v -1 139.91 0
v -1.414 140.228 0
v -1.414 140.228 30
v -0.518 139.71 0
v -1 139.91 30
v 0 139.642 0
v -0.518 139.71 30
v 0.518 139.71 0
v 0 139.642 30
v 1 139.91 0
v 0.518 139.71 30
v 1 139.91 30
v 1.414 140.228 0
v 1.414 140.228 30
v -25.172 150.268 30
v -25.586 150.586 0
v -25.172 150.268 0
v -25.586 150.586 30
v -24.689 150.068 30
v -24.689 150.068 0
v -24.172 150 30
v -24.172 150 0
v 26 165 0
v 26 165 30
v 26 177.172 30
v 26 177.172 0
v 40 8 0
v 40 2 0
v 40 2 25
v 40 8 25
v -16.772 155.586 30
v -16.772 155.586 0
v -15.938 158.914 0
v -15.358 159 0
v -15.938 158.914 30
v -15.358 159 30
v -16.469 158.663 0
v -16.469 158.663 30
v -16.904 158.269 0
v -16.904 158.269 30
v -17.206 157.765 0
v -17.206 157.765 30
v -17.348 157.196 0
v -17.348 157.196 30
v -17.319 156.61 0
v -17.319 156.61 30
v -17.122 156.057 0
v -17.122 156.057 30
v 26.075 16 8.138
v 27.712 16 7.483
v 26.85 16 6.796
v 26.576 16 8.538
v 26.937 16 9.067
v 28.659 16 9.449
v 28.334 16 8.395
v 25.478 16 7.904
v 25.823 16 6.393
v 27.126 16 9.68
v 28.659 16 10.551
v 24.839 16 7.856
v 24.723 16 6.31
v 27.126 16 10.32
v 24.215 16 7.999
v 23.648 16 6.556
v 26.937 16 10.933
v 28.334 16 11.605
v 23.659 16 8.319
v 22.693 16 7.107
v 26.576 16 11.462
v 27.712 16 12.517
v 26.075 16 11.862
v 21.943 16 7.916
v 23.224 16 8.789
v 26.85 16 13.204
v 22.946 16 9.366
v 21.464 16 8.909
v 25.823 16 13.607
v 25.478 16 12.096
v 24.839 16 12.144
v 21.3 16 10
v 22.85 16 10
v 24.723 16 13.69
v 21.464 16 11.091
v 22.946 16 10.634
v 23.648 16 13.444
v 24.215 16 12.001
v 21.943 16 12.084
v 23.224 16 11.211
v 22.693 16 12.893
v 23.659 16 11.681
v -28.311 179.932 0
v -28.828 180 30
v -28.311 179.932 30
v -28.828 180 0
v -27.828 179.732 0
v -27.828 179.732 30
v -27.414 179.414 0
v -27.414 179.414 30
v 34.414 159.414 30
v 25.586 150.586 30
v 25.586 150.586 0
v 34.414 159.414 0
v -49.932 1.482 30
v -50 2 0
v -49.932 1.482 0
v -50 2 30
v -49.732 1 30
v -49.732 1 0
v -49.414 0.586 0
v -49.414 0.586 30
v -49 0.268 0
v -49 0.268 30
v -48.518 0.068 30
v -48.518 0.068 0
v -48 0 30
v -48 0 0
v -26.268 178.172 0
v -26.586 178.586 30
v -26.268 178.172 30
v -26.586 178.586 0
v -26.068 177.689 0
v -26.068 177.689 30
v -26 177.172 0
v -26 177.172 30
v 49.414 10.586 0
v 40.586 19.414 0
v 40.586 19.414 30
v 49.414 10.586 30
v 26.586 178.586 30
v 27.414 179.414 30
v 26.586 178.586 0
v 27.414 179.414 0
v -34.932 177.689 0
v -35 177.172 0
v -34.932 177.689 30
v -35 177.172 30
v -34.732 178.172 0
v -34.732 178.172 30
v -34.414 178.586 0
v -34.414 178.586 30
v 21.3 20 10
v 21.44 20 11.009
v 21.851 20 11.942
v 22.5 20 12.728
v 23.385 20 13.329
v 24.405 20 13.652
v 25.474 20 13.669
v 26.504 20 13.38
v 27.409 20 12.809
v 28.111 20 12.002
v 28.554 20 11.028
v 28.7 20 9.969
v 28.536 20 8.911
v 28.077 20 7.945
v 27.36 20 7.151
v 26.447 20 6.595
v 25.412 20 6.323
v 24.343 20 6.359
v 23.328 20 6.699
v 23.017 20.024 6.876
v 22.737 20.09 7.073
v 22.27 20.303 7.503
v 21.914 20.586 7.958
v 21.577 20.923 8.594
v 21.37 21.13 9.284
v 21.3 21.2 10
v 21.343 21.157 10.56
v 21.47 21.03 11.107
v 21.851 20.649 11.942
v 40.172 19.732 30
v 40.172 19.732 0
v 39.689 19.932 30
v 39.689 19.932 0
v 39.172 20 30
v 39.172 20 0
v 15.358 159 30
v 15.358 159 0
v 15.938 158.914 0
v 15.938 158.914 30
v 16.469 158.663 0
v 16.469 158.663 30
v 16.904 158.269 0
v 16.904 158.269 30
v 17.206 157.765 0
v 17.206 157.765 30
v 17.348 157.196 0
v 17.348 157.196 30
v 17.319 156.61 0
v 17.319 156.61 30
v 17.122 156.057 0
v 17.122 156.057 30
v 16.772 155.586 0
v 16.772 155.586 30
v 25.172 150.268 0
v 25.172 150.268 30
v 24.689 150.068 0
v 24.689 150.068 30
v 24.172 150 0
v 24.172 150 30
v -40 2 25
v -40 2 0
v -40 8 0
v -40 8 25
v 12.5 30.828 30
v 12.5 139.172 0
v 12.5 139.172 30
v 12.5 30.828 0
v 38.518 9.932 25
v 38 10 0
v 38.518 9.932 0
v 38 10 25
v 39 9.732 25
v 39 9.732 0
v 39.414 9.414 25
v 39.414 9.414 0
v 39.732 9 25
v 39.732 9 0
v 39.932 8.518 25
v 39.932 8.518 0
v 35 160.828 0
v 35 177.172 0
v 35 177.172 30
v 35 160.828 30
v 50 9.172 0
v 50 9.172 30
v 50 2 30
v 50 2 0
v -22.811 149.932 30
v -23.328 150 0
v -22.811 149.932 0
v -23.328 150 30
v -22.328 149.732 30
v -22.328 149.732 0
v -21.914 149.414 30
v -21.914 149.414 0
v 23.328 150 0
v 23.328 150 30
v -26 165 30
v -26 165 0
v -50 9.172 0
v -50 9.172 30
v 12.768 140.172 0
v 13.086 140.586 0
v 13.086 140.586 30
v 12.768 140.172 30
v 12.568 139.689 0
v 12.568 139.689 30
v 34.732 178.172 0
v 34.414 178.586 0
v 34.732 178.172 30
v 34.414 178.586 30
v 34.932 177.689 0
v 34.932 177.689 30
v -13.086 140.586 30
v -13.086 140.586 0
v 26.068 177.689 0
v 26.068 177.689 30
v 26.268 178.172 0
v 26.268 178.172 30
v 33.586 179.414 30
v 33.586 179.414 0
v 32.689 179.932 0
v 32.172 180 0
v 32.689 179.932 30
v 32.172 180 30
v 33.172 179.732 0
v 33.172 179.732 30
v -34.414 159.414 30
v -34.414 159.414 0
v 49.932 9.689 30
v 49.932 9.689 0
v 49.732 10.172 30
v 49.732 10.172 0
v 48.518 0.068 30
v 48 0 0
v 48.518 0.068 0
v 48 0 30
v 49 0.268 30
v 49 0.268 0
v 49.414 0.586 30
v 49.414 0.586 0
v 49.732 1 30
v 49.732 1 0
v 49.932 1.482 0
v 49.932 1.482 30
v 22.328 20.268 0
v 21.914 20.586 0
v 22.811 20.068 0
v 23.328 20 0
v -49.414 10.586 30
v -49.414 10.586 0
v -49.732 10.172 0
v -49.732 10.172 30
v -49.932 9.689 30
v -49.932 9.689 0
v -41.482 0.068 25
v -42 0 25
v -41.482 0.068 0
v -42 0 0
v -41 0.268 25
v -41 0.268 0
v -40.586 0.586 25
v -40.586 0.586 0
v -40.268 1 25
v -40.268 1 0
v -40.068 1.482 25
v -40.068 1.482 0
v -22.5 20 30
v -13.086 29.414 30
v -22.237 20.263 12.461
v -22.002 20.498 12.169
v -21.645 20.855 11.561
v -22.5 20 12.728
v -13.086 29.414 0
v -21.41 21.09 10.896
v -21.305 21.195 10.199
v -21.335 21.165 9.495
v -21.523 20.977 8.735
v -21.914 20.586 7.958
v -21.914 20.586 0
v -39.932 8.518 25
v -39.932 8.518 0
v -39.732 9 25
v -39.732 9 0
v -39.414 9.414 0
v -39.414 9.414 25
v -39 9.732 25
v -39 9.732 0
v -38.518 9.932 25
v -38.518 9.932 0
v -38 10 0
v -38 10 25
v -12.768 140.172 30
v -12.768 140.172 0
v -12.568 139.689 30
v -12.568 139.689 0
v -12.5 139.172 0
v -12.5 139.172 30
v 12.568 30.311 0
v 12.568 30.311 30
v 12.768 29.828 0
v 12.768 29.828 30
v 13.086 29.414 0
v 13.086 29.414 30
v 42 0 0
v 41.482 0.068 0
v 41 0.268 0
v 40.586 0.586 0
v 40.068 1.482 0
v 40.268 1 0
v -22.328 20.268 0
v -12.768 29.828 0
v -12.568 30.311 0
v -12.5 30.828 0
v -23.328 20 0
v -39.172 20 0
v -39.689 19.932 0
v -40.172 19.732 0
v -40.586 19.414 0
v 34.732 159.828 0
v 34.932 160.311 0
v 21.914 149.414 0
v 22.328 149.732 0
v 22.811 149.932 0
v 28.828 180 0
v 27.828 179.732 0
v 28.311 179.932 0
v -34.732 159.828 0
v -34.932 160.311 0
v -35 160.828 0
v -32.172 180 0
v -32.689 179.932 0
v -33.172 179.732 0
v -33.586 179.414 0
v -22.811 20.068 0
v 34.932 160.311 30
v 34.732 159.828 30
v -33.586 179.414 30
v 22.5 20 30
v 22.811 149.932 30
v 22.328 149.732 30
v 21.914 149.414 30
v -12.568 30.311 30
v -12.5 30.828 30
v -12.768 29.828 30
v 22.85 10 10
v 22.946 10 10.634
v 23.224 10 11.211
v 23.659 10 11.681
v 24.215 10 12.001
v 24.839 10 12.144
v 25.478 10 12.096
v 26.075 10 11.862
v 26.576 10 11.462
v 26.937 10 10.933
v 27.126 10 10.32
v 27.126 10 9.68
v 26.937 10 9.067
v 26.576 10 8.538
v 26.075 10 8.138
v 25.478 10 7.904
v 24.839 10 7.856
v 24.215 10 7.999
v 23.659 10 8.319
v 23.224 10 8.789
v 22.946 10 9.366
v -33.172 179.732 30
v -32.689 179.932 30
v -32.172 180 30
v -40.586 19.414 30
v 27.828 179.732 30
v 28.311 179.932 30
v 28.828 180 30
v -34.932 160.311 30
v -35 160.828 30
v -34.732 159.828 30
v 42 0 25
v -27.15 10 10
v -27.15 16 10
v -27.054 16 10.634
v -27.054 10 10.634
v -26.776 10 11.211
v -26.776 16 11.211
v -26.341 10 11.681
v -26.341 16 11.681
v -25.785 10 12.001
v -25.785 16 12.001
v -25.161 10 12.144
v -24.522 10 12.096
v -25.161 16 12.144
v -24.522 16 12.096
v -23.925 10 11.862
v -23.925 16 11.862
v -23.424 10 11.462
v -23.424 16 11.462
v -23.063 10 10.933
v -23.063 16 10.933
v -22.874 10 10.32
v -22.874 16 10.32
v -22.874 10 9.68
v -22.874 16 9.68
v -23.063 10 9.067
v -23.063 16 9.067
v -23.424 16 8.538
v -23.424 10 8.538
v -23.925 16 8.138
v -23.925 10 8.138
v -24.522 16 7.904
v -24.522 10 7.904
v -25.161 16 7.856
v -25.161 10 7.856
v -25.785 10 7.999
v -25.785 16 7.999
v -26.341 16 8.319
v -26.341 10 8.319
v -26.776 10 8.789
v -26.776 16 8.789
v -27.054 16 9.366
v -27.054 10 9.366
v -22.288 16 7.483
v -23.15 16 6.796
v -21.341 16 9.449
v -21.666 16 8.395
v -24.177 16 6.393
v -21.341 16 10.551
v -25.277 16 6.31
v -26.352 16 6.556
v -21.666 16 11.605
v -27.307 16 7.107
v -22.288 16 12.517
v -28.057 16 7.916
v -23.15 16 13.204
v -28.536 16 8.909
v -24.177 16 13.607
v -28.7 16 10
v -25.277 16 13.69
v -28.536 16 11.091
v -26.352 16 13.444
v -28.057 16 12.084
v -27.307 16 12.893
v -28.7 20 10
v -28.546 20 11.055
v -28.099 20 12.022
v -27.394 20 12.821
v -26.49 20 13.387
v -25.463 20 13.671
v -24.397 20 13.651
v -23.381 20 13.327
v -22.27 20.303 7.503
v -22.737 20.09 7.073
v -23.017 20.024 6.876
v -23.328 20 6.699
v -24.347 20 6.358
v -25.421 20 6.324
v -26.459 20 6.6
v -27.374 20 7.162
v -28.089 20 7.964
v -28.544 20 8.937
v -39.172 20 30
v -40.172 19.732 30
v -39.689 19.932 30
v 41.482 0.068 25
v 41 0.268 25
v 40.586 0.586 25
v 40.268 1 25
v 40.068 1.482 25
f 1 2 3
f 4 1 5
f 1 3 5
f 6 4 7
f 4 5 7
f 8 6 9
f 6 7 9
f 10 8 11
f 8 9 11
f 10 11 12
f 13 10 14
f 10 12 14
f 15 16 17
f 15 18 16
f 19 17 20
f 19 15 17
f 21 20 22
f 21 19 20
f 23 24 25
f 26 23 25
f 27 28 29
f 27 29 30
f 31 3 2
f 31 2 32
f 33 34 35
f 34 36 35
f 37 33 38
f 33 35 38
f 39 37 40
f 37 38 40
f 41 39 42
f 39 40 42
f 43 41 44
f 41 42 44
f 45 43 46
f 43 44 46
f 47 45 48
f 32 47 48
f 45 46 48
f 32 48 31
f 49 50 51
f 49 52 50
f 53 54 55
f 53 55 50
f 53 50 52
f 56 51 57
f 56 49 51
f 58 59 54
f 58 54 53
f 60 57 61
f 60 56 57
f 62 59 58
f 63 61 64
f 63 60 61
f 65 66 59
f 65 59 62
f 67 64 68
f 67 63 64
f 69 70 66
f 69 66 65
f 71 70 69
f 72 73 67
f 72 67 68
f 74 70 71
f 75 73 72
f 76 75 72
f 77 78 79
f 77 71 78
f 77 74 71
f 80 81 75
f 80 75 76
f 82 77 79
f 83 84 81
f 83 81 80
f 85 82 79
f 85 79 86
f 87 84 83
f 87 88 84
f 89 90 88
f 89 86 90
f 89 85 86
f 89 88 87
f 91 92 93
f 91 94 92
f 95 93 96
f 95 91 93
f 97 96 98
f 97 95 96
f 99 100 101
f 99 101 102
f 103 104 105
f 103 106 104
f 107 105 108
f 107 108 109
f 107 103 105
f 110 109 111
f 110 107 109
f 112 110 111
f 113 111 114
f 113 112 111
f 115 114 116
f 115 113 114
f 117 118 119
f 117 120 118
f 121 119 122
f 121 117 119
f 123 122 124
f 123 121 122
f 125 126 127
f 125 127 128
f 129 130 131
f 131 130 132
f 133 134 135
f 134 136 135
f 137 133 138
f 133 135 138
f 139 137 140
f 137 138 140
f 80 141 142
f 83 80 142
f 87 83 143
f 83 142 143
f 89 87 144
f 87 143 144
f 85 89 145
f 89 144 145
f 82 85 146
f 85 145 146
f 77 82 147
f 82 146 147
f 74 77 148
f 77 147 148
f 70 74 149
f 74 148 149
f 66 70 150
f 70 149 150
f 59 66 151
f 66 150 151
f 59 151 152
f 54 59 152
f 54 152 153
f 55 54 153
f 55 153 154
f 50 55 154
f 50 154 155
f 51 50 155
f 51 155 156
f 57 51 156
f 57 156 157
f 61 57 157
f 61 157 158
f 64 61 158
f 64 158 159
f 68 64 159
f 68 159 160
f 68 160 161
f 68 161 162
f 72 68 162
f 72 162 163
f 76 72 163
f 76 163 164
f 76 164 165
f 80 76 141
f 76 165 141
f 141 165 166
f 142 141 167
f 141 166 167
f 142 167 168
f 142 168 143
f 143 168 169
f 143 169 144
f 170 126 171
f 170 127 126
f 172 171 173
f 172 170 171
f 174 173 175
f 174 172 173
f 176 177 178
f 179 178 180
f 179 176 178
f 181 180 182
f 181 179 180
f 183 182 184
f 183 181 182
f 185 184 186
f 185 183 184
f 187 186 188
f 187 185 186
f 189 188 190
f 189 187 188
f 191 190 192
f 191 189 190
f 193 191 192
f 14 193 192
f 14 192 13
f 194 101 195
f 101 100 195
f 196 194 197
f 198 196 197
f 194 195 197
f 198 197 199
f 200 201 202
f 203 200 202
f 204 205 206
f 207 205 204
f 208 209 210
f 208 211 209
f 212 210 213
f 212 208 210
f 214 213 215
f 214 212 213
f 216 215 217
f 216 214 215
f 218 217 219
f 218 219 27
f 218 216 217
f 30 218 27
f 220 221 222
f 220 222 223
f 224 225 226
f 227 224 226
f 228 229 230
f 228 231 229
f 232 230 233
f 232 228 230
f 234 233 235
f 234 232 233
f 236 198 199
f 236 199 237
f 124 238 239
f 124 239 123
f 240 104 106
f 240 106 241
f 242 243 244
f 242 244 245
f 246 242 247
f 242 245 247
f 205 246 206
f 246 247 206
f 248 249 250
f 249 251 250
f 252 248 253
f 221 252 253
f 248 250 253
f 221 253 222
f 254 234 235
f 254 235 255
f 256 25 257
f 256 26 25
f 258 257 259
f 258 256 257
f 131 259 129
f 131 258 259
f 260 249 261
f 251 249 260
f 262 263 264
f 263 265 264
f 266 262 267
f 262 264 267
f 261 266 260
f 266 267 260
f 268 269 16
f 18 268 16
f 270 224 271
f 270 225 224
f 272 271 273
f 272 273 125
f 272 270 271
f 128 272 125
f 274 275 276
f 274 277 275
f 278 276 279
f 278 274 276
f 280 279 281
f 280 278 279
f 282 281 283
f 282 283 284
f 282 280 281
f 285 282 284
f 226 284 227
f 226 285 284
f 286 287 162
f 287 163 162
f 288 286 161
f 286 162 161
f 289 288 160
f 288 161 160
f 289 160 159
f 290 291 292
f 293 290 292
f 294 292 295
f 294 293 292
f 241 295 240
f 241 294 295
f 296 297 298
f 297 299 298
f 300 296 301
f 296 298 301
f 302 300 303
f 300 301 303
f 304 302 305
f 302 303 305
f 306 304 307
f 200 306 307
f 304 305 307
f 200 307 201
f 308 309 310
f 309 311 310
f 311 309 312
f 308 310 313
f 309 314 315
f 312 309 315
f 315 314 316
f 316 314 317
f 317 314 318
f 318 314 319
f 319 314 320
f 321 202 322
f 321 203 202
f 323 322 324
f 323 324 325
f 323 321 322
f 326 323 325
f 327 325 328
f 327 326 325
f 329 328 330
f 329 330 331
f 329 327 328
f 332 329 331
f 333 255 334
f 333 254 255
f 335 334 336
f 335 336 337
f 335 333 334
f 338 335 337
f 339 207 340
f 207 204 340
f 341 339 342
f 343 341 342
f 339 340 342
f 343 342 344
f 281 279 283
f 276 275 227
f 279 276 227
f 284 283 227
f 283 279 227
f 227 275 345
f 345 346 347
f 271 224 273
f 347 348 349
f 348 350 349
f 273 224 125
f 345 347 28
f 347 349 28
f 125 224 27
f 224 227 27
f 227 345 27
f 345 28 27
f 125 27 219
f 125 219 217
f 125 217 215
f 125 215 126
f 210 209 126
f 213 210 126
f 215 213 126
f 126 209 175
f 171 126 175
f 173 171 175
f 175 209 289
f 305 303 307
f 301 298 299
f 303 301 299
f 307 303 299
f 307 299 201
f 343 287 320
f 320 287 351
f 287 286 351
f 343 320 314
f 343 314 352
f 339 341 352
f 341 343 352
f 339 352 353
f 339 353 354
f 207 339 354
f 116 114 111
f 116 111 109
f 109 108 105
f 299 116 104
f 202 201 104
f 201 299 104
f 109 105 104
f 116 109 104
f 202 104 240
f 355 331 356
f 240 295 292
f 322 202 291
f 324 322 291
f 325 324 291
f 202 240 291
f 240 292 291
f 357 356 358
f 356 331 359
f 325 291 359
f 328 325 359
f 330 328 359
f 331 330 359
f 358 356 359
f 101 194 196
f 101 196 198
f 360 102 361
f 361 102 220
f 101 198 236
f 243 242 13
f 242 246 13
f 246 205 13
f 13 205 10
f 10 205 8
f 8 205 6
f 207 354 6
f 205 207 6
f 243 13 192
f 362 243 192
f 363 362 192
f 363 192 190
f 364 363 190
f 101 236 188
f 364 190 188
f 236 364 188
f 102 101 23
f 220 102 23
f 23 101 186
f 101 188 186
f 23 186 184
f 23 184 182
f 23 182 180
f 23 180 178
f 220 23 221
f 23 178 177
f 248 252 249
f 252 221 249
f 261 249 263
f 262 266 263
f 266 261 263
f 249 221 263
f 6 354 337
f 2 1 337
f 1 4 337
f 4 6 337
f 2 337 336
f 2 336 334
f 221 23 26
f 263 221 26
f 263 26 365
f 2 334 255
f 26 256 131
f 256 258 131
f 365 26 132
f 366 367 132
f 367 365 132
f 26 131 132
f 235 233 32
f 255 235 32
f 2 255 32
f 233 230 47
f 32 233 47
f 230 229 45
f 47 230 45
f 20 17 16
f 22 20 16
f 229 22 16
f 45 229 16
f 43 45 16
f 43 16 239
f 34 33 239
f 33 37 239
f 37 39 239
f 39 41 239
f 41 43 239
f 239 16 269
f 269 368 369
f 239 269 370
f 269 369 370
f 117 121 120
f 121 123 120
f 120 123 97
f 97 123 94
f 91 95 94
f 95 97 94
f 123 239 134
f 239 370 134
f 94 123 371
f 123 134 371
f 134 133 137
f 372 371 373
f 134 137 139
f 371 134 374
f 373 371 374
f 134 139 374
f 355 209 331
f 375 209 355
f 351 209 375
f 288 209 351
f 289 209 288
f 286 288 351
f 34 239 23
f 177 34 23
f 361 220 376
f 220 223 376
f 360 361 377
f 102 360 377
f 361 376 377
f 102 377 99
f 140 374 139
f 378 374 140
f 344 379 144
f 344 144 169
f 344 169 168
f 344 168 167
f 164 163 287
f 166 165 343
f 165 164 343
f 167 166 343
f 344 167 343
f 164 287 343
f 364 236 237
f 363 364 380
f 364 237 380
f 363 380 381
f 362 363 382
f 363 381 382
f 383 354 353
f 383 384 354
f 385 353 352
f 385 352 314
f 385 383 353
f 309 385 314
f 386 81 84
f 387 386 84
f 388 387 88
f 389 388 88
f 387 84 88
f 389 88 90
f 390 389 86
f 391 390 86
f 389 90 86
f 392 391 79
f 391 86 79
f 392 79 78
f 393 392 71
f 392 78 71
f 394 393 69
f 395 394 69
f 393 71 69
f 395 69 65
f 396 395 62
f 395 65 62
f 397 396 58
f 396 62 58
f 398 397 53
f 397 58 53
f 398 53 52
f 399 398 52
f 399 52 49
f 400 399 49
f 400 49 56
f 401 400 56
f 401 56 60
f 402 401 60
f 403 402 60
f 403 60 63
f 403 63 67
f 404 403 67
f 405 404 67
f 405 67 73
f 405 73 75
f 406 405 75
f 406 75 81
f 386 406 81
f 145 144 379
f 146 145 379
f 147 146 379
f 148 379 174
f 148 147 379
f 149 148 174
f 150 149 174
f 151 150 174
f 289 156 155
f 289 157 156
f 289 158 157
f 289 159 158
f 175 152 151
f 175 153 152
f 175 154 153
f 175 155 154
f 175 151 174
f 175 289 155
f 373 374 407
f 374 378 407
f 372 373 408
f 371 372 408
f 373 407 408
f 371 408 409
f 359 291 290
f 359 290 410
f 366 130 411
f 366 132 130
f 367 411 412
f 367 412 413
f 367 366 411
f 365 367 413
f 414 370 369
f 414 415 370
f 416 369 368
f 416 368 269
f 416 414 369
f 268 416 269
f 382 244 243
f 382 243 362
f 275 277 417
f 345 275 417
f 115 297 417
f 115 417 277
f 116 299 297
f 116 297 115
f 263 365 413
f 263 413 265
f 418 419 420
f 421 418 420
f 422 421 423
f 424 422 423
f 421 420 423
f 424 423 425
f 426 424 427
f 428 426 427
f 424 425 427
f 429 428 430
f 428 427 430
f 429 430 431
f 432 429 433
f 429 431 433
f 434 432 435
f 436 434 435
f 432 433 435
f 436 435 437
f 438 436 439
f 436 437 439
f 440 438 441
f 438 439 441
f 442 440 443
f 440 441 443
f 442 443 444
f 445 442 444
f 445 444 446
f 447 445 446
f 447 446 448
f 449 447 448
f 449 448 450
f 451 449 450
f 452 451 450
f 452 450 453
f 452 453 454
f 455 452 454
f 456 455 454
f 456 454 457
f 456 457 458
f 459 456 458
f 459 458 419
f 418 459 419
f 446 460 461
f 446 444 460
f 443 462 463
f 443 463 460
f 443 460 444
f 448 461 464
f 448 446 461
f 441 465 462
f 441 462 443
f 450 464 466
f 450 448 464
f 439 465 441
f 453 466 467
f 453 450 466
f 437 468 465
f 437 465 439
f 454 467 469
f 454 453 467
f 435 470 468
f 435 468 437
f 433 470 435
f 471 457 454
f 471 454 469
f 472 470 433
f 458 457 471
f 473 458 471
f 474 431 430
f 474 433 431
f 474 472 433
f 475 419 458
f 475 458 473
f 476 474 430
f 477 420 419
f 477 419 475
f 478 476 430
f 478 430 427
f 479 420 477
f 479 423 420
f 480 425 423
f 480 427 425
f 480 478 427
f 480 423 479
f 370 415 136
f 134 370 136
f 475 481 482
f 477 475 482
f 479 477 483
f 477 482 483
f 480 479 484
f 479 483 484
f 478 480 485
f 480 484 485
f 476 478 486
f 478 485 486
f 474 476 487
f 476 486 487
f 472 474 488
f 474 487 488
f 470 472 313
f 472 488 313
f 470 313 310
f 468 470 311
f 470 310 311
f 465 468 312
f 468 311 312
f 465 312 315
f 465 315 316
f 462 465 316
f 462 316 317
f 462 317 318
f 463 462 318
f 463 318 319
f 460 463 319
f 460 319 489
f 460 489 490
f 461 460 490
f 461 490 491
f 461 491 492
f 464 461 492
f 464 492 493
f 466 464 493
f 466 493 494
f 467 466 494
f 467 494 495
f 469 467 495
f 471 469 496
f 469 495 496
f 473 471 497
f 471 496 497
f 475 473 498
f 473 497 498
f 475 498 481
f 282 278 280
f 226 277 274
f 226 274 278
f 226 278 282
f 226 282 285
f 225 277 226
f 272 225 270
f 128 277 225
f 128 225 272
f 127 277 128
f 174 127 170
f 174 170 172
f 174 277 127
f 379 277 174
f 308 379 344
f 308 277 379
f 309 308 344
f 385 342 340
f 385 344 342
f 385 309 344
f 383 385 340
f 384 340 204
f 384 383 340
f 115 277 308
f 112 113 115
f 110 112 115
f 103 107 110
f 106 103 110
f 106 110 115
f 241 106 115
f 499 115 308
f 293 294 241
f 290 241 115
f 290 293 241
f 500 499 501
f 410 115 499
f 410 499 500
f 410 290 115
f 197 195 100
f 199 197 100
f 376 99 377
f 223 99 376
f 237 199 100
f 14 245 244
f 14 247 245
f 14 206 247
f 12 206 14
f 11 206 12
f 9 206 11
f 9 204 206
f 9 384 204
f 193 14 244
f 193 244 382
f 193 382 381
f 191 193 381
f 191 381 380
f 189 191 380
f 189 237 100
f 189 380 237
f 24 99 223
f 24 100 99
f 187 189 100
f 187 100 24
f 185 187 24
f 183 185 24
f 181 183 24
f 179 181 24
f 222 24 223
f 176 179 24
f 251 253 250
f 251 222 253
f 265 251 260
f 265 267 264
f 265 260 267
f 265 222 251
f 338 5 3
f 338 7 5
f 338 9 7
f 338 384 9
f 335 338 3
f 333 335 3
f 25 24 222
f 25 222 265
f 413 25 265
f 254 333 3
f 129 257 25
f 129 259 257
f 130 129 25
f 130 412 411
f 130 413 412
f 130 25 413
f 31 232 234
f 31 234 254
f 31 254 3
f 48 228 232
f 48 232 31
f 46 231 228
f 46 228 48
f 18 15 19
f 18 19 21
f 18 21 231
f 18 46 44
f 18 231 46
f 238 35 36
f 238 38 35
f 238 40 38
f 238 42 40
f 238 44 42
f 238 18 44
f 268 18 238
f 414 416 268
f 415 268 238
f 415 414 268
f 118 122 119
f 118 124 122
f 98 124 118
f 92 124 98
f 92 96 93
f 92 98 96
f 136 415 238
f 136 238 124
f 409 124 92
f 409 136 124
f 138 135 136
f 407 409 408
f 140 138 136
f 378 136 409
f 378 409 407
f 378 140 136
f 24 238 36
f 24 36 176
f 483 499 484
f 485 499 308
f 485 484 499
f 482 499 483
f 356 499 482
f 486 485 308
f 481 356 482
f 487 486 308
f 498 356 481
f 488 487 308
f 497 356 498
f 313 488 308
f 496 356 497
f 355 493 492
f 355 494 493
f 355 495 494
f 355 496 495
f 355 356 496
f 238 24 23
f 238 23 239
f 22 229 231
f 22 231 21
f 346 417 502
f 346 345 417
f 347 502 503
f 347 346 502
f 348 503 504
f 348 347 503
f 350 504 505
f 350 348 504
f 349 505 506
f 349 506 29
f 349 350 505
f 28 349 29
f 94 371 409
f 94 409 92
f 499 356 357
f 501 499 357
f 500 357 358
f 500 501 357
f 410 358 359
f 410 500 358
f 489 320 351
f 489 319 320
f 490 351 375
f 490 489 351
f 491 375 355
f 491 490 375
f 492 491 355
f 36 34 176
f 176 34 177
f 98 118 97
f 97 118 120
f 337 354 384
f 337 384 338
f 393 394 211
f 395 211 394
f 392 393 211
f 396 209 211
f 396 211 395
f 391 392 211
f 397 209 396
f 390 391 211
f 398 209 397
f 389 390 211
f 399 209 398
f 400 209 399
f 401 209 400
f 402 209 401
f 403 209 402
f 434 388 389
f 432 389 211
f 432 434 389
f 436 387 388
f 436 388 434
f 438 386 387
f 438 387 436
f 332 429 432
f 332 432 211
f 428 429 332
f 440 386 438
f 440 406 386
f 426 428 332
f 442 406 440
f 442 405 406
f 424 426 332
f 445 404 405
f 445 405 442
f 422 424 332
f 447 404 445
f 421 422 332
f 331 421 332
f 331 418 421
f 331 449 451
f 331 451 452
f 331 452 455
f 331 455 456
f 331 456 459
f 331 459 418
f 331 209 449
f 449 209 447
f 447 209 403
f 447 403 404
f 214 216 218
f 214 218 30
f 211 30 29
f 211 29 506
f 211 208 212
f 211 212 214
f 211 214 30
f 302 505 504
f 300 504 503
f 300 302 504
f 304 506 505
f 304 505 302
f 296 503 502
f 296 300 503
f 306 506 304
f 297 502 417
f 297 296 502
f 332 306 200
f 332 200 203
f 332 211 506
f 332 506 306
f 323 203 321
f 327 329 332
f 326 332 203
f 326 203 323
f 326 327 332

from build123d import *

# Parameters (mm, degrees)
EXTRUDE_1_DEPTH     = 30
SKETCH_3_W          = 52
SKETCH_3_H          = 30
CUT_EXTRUDE_1_DEPTH = 190.208879284
SKETCH_4_W          = 80
SKETCH_4_H          = 20
CUT_EXTRUDE_2_DEPTH = 25
SKETCH_5_R          = 2.15
CUT_EXTRUDE_3_DEPTH = 171.293863659
SKETCH_6_R          = 3.7
CUT_EXTRUDE_4_DEPTH = 4
CHAMFER_1_SIZE      = 10
CHAMFER_2_SIZE      = 2
FILLET_1_R          = 2
CUT_EXTRUDE_5_DEPTH = 190.208879284
FILLET_2_R          = 2


with BuildPart() as part:
    # 草图2 → 凸台-拉伸1 (new body)
    with BuildSketch(Plane.XY):
        Polygon((-35, 180), (35, 180), (35, 150), (12.5, 150), (12.5, 20), (50, 20), (50, 0), (-50, 0), (-50, 20), (-12.5, 20), (-12.5, 150), (-35, 150), align=None)
    extrude(amount=EXTRUDE_1_DEPTH)

    # 草图3 → 切除-拉伸1 (cut, through all)
    with BuildSketch(Plane(origin=(0, 0, 30), x_dir=(-1, 0, 0), z_dir=(0, 0, -1))):
        with Locations((0, 180)):
            Rectangle(SKETCH_3_W, SKETCH_3_H)
    extrude(amount=CUT_EXTRUDE_1_DEPTH, mode=Mode.SUBTRACT)

    # 草图4 → 切除-拉伸2 (cut)
    with BuildSketch(Plane(origin=(0, 0, 0), x_dir=(-1, 0, 0), z_dir=(0, 0, -1))):
        Rectangle(SKETCH_4_W, SKETCH_4_H)
    extrude(amount=-CUT_EXTRUDE_2_DEPTH, mode=Mode.SUBTRACT)

    # 草图5 → 切除-拉伸3 (cut, through all)
    with BuildSketch(Plane(origin=(0, 20, 0), x_dir=(1, 0, 0), z_dir=(0, 1, 0))):
        with Locations(Location((-25, -10, 0), (0, 0, 180))):
            Circle(SKETCH_5_R)
        with Locations(Location((25, -10, 0), (0, 0, 180))):
            Circle(SKETCH_5_R)
    extrude(amount=-CUT_EXTRUDE_3_DEPTH, mode=Mode.SUBTRACT)

    # 草图6 → 切除-拉伸4 (cut)
    with BuildSketch(Plane(origin=(0, 20, 0), x_dir=(1, 0, 0), z_dir=(0, 1, 0))):
        with Locations(Location((25, -10, 0), (0, 0, 180))):
            Circle(SKETCH_6_R)
        with Locations(Location((-25, -10, 0), (0, 0, 180))):
            Circle(SKETCH_6_R)
    extrude(amount=-CUT_EXTRUDE_4_DEPTH, mode=Mode.SUBTRACT)

    # 倒角1
    # the kernel refuses this chamfer: 10 mm, written as the material it adds along each edge
    with BuildSketch(Plane(origin=(12.5, 150, 0), x_dir=(-0.027495876610586452, -0.9996219169112968, 0), z_dir=(0, 0, 1)), Plane(origin=(-12.5, 150, 0), x_dir=(-0.9996219169112968, 0.0274958766105877, 0), z_dir=(0, 0, 1))) as chamfer_1_piece_1:
        Polygon((CHAMFER_1_SIZE * 0.999621916911, CHAMFER_1_SIZE * 0.0274958766106), (-CHAMFER_1_SIZE * 0.0274958766106, CHAMFER_1_SIZE * 0.999621916911), (0, 0), align=None)
    extrude(amount=30)
    with BuildSketch(Plane(origin=(12.5, 20, 0), x_dir=(0.9996219169112968, -0.027495876610586313, 0), z_dir=(0, 0, 1))) as chamfer_1_piece_2_section:
        Polygon((CHAMFER_1_SIZE * 0.999621916911, CHAMFER_1_SIZE * 0.0274958766106), (-CHAMFER_1_SIZE * 0.0274958766106, CHAMFER_1_SIZE * 0.999621916911), (0, 0), align=None)
    chamfer_1_piece_2 = extrude(amount=30, mode=Mode.PRIVATE)
    chamfer_1_piece_2 = chamfer_1_piece_2 - Plane(origin=(25, 23.307134121, 10), x_dir=(-1, 0, 0), z_dir=(0, 1, 0)) * Cylinder(3.7, 100, mode=Mode.PRIVATE)
    add(chamfer_1_piece_2)
    with BuildSketch(Plane(origin=(-12.5, 20, 0), x_dir=(0.027495876610586147, 0.9996219169112968, 0), z_dir=(0, 0, 1))) as chamfer_1_piece_3_section:
        Polygon((CHAMFER_1_SIZE * 0.999621916911, CHAMFER_1_SIZE * 0.0274958766106), (-CHAMFER_1_SIZE * 0.0274958766106, CHAMFER_1_SIZE * 0.999621916911), (0, 0), align=None)
    chamfer_1_piece_3 = extrude(amount=30, mode=Mode.PRIVATE)
    chamfer_1_piece_3 = chamfer_1_piece_3 - Plane(origin=(-25, 23.30713415, 10), x_dir=(-1, 0, 0), z_dir=(0, 1, 0)) * Cylinder(3.7, 100, mode=Mode.PRIVATE)
    add(chamfer_1_piece_3)
    # the kernel refuses this chamfer: 10 mm, written as the material it takes off along each edge
    with BuildSketch(Plane(origin=(35, 150, -25.71682988), x_dir=(-0.9996219169112968, -0.0274958766105877, 0), z_dir=(0, 0, 1)), Plane(origin=(-35, 150, -25.71682988), x_dir=(-0.027495876610586282, 0.9996219169112968, 0), z_dir=(0, 0, 1))) as chamfer_1_2_piece_1:
        Polygon((CHAMFER_1_SIZE * 0.999621916911, -CHAMFER_1_SIZE * 0.0274958766106), (-CHAMFER_1_SIZE * 0.0274958766106, -CHAMFER_1_SIZE * 0.999621916911), (0, 0), align=None)
    extrude(amount=81.433659759, mode=Mode.SUBTRACT)
    with BuildSketch(Plane(origin=(50, 20, -25.71682988), x_dir=(-0.9996219169112968, 0.027495876610586317, 0), z_dir=(0, 0, 1)), Plane(origin=(-50, 20, -25.71682988), x_dir=(-0.027495876610585626, -0.9996219169112968, 0), z_dir=(0, 0, 1))) as chamfer_1_2_piece_2:
        Polygon((CHAMFER_1_SIZE * 0.999621916911, CHAMFER_1_SIZE * 0.0274958766106), (-CHAMFER_1_SIZE * 0.0274958766106, CHAMFER_1_SIZE * 0.999621916911), (0, 0), align=None)
    extrude(amount=81.433659759, mode=Mode.SUBTRACT)

    # 倒角2
    chamfer_2_edges = [part.edges().sort_by_distance(p)[0] for p in [
        (-35, 180, 15),
        (35, 180, 15),
        (26, 180, 15),
        (-26, 180, 15),
    ]]
    chamfer(chamfer_2_edges, length=CHAMFER_2_SIZE)

    # 圆角1
    fillet_1_edges = [part.edges().sort_by_distance(p)[0] for p in [
        (-35, 160, 15),
        (-25, 150, 15),
        (-22.5, 150, 15),
        (-12.5, 140, 15),
        (-12.5, 30, 15),
        (-22.5, 20, 3.63618183),
        (-40, 20, 15),
        (-50, 10, 15),
        (-50, 0, 15),
        (-40, 0, 12.5),
        (-40, 10, 12.5),
        (40, 10, 12.5),
        (40, 0, 12.5),
        (50, 0, 15),
        (50, 10, 15),
        (40, 20, 15),
        (22.5, 20, 3.63618183),
        (12.5, 30, 15),
        (22.5, 150, 15),
        (25, 150, 15),
        (35, 160, 15),
        (35, 178, 15),
        (33, 180, 15),
        (28, 180, 15),
        (26, 178, 15),
        (-26, 178, 15),
        (-28, 180, 15),
        (-33, 180, 15),
        (-35, 178, 15),
        (12.5, 140, 15),
    ]]
    fillet(fillet_1_edges, radius=FILLET_1_R)

    # 草图7 → 切除-拉伸5 (cut, through all)
    with BuildSketch(Plane(origin=(0, 0, 0), x_dir=(-1, 0, 0), z_dir=(0, 0, -1))):
        Polygon((-20.186291501, 159), (0, 138.813708499), (20.186291501, 159), align=None)
    extrude(amount=-CUT_EXTRUDE_5_DEPTH, mode=Mode.SUBTRACT)

    # 圆角2
    fillet_2_edges = [part.edges().sort_by_distance(p)[0] for p in [
        (20.186291501, 159, 15),
        (-20.186291501, 159, 15),
        (0, 138.813708499, 15),
    ]]
    fillet(fillet_2_edges, radius=FILLET_2_R)


solid = part.part
